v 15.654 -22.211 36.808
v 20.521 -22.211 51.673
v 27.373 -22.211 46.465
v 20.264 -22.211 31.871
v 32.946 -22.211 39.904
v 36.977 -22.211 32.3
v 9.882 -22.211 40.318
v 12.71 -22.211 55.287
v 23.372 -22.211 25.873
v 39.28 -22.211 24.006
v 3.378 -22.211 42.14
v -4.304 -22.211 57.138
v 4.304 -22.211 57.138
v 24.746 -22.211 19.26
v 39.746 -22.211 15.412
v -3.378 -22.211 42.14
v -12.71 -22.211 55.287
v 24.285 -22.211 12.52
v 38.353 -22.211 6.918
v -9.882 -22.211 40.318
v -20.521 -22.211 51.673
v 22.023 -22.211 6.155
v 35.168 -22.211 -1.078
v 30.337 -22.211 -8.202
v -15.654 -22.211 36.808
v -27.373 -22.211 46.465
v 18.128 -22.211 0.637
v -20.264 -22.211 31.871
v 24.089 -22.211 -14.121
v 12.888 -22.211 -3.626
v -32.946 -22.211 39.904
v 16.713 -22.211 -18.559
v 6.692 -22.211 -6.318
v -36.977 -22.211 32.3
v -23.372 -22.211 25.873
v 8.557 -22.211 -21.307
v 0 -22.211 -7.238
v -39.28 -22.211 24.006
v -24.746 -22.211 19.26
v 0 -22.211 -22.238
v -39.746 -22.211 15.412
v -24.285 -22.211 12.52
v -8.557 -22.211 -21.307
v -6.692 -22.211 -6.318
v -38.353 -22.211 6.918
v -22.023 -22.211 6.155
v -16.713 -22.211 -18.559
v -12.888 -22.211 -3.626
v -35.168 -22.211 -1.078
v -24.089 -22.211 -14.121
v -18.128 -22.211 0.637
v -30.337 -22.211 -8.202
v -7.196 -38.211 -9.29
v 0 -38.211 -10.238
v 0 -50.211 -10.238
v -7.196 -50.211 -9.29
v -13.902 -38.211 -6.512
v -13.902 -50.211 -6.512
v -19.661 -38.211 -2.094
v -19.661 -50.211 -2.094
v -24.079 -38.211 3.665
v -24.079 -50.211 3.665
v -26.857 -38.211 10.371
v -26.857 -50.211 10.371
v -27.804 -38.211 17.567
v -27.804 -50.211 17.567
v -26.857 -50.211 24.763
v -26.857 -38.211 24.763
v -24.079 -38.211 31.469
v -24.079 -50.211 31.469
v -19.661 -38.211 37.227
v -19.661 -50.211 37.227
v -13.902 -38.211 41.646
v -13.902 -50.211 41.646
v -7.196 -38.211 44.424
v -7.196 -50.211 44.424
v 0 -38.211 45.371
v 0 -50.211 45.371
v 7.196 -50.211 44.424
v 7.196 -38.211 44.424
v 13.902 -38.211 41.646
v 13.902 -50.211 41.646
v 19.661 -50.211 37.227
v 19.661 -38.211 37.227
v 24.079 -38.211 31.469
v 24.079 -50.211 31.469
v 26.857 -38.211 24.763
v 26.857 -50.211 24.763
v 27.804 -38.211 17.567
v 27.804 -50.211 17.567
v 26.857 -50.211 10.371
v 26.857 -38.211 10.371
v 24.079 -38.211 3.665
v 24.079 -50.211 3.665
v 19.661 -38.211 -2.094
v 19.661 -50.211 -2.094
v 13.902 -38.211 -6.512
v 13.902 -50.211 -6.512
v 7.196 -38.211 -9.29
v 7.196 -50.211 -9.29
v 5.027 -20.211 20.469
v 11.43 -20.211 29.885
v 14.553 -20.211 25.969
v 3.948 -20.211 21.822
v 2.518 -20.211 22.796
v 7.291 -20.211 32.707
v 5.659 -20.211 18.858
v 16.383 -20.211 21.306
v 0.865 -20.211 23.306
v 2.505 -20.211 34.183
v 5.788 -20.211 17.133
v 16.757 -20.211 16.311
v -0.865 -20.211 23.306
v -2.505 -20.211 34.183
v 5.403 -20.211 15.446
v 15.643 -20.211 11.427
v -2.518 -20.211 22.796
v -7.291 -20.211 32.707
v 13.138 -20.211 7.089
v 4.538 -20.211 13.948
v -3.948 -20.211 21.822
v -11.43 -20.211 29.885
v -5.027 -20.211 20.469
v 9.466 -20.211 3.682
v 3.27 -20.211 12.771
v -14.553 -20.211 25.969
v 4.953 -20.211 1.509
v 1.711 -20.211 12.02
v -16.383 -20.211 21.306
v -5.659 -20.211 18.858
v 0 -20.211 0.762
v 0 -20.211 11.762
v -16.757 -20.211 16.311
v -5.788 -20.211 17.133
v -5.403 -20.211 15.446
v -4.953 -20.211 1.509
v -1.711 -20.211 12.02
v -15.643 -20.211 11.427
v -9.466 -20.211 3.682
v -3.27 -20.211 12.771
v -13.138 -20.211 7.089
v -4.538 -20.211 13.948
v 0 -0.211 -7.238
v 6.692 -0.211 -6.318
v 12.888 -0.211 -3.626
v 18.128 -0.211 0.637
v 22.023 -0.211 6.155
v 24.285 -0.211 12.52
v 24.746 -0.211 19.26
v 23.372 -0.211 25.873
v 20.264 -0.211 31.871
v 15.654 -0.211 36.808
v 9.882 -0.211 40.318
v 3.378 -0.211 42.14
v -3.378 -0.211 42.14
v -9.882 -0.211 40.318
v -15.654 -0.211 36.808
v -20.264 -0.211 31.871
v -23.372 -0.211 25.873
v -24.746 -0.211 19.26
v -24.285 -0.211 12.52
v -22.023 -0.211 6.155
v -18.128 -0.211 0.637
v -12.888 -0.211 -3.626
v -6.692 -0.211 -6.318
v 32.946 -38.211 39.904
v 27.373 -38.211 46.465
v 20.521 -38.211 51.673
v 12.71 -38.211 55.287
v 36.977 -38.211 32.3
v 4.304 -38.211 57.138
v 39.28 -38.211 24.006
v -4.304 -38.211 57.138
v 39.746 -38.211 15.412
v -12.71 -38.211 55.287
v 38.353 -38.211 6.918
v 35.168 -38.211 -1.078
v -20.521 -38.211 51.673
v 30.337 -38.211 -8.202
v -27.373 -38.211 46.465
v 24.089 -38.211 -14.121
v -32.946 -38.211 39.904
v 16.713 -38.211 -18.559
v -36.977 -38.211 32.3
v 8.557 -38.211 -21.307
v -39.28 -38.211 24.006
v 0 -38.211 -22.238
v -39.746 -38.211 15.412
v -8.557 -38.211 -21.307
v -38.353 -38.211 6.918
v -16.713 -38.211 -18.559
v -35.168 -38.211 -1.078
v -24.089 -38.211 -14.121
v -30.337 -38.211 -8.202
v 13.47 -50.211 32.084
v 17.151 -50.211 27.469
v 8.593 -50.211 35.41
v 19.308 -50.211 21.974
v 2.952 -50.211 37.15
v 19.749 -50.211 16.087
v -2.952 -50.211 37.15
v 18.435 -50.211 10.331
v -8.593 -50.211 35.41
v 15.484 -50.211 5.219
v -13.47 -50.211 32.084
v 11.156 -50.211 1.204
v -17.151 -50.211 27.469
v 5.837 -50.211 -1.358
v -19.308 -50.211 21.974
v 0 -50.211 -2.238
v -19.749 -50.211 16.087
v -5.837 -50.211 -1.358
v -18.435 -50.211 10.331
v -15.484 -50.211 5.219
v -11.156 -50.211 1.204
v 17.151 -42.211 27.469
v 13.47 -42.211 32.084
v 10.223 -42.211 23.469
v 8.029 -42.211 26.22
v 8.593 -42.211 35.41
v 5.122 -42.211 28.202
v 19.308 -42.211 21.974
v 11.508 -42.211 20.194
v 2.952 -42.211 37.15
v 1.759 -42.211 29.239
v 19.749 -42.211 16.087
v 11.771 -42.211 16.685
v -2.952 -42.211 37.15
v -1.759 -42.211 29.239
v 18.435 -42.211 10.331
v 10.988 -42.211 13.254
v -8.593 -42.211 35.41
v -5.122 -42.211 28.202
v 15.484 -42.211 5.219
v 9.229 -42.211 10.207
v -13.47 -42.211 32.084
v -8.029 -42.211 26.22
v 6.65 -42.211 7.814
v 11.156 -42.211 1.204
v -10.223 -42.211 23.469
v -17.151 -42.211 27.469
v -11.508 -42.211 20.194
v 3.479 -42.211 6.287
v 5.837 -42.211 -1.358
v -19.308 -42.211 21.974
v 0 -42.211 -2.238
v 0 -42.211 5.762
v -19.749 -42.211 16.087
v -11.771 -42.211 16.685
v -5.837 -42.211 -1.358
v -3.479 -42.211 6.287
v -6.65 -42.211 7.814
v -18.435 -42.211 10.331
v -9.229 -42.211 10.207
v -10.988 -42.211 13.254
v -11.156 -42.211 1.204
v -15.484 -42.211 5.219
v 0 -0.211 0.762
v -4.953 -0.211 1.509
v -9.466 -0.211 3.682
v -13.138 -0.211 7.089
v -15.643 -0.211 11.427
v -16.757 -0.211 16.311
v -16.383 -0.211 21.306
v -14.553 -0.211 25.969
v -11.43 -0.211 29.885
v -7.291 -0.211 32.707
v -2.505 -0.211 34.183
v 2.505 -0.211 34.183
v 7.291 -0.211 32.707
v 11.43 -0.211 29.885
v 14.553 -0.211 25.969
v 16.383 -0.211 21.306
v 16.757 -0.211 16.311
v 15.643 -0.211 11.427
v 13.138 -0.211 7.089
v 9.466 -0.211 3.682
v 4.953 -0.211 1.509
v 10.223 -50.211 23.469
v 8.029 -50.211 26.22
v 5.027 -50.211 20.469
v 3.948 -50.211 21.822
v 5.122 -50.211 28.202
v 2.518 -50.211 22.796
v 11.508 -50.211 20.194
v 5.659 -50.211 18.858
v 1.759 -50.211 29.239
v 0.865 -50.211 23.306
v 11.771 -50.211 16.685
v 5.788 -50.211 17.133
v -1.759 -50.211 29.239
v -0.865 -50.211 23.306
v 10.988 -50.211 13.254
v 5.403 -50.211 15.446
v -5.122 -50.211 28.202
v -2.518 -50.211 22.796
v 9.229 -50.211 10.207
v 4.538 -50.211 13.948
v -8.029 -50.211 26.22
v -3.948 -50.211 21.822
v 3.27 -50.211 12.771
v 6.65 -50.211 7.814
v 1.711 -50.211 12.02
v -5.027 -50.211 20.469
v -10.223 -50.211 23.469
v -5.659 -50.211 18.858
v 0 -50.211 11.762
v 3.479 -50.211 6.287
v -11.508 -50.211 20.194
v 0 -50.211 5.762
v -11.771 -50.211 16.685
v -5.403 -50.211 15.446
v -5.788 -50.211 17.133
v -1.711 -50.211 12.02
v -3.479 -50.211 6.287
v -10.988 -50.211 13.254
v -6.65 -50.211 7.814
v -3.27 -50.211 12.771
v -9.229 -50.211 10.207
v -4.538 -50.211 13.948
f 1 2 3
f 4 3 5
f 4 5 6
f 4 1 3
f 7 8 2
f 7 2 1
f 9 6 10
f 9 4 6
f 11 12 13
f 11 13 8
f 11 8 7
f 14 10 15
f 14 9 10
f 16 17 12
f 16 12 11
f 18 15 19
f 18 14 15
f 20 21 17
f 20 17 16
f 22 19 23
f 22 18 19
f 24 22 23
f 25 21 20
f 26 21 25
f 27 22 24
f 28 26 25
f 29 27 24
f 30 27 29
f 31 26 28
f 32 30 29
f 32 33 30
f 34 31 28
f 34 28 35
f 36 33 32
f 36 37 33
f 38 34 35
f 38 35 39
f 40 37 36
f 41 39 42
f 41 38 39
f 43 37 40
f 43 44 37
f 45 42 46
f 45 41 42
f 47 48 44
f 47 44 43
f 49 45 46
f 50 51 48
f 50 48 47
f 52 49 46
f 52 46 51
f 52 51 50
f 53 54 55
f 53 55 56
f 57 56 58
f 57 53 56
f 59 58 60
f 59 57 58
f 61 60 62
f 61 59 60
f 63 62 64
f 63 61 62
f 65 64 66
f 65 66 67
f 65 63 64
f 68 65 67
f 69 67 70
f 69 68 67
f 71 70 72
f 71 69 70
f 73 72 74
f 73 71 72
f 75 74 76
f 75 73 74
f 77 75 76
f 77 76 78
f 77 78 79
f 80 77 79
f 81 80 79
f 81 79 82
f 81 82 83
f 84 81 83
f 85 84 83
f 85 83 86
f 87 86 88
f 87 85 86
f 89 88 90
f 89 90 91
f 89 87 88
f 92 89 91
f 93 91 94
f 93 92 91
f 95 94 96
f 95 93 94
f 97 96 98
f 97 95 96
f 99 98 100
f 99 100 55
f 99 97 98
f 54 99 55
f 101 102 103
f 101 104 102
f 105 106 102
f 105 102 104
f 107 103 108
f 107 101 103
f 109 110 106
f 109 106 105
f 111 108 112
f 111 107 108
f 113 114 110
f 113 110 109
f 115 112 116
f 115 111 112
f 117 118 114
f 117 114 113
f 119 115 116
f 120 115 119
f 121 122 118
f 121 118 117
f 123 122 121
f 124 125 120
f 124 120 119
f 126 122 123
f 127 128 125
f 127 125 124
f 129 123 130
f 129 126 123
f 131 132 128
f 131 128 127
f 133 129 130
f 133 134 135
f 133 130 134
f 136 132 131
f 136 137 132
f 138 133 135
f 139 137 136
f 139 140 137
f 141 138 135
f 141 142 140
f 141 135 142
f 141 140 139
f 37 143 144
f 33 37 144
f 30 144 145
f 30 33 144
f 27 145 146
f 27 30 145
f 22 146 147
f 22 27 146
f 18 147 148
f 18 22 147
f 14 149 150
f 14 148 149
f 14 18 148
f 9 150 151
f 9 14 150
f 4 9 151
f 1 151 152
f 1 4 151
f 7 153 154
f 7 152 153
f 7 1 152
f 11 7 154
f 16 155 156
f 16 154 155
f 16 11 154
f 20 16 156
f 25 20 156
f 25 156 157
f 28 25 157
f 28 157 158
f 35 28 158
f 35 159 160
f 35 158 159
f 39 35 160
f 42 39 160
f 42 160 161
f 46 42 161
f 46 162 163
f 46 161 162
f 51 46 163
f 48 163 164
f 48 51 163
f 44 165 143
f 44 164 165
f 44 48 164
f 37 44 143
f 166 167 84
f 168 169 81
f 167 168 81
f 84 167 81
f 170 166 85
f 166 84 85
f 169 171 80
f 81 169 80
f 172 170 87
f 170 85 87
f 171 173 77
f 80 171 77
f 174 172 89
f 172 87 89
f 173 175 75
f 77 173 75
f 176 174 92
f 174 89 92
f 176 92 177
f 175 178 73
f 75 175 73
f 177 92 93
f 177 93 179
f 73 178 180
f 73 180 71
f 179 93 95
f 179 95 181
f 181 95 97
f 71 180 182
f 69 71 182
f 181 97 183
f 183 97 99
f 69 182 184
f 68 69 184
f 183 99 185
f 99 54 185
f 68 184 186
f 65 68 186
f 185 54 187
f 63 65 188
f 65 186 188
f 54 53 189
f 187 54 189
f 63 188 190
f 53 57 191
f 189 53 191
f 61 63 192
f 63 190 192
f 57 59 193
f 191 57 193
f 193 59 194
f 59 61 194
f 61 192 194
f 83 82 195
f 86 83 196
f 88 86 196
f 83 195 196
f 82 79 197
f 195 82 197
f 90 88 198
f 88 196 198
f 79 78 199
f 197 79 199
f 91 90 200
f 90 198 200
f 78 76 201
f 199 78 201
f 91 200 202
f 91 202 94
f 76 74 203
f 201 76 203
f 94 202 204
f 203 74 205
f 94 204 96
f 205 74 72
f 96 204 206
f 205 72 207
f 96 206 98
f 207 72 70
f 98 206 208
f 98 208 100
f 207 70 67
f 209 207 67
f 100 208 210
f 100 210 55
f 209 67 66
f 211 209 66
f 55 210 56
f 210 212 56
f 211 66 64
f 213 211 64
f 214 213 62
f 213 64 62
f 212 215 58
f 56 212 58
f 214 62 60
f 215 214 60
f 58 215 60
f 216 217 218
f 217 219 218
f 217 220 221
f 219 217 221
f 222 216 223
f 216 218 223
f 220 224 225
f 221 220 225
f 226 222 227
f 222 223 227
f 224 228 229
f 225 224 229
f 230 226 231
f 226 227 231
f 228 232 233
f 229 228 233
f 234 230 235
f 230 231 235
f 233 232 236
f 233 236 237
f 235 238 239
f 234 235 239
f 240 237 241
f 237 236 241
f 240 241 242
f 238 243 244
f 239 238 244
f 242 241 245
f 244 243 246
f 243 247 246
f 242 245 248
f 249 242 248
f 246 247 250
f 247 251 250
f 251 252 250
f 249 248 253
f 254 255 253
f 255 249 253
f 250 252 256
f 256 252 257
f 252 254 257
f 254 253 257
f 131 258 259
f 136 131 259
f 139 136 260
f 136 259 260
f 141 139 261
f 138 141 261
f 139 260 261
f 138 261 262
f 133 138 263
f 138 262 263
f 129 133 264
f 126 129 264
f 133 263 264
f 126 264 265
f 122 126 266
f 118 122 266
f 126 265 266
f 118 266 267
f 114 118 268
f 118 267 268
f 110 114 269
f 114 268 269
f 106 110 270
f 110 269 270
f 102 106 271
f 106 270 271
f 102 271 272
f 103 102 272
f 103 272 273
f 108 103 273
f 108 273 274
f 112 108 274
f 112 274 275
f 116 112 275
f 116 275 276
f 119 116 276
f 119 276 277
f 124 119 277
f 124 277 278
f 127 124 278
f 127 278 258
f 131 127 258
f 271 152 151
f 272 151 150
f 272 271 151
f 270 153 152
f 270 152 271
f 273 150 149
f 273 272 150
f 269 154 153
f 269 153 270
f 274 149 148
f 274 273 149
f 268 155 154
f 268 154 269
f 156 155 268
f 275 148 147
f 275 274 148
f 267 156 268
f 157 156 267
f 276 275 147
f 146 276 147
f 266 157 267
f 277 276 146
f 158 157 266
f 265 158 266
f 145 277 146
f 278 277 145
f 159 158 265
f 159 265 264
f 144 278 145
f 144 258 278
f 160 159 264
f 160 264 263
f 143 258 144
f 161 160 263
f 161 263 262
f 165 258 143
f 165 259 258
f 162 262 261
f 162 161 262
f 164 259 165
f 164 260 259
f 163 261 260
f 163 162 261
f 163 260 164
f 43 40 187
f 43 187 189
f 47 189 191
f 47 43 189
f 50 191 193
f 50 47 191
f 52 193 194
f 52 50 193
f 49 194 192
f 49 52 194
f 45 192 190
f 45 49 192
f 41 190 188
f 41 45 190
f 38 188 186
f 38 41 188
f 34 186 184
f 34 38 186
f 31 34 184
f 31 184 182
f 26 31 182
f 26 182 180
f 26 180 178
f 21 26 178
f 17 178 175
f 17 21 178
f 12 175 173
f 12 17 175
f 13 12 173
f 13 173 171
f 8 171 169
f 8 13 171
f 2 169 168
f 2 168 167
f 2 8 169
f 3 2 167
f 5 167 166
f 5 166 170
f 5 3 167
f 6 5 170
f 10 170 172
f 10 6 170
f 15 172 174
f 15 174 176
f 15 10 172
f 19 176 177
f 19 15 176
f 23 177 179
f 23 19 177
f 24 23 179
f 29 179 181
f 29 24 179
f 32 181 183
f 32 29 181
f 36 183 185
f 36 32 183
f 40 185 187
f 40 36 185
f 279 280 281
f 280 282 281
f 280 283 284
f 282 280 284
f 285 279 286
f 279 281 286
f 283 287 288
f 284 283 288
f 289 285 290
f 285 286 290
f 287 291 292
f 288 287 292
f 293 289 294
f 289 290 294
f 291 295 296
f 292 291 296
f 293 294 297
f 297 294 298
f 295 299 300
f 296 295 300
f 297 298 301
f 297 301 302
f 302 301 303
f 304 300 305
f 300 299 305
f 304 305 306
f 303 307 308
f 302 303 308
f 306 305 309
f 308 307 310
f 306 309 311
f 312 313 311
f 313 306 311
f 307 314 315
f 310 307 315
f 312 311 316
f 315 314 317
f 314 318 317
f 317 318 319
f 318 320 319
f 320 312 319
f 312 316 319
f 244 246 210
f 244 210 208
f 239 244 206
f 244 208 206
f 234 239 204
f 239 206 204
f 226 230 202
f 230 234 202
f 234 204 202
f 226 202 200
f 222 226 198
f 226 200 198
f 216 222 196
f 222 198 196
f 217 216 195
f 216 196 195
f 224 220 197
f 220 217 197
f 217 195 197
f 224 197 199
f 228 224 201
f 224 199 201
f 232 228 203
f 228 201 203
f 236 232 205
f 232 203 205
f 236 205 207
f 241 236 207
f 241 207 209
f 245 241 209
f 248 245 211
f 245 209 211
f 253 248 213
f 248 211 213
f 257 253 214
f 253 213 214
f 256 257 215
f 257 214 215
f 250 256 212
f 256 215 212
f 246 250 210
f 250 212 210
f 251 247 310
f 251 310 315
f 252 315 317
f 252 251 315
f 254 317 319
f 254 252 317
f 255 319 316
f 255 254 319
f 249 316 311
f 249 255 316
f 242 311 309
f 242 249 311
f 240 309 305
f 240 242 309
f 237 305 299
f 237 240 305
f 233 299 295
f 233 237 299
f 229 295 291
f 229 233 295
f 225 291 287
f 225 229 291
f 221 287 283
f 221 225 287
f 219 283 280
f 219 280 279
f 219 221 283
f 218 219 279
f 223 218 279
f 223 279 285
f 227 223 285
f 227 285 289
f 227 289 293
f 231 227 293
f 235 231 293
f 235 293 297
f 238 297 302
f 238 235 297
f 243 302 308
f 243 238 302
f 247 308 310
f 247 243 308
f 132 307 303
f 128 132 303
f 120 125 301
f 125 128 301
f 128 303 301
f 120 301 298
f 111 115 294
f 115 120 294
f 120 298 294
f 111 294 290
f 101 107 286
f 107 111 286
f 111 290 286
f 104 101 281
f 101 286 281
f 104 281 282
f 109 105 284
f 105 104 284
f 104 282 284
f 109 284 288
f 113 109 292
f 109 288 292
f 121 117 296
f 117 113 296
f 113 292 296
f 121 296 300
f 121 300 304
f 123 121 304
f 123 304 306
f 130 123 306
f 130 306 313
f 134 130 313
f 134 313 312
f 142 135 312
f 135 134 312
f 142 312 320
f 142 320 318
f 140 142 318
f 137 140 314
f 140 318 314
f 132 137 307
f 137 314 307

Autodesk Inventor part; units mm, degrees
ref_plane "YZ Plane" through (0, 0, 0) normal (1, 0, 0) x (0, 1, 0)
ref_plane "XZ Plane" through (0, 0, 0) normal (0, 1, 0) x (-1, 0, 0)
ref_plane "XY Plane" through (0, 0, 0) normal (0, 0, 1) x (1, 0, 0)
sketch "Эскиз1" plane through (0, 0, 0) normal (1, 0, 0) x (0, 1, 0)
  line L0 (-20.211, 11.7625) -> (-20.211, 0.7625)
  line L1 (-20.211, 0.7625) -> (-0.211, 0.7625)
  line L2 (-0.211, 0.7625) -> (-0.211, -7.2375)
  line L3 (-0.211, -7.2375) -> (-22.211, -7.2375)
  line L4 (-22.211, -7.2375) -> (-22.211, -22.2375)
  line L5 (-20.211, 11.7625) -> (-50.211, 11.7625)
  line L6 (-50.211, 11.7625) -> (-50.211, 5.7625)
  line L7 (-50.211, 5.7625) -> (-42.211, 5.7625)
  line L8 (-42.211, 5.7625) -> (-42.211, -2.2375)
  line L9 (-42.211, -2.2375) -> (-50.211, -2.2375)
  line L10 (-50.211, -2.2375) -> (-50.211, -10.2375)
  line L11 (-50.211, -10.2375) -> (-38.211, -10.2375)
  line L12 (-38.211, -10.2375) -> (-38.211, -22.2375)
  line L13 (-38.211, -22.2375) -> (-22.211, -22.2375)
  point P0 (0, 0)
  dimension "d0" = 15
  dimension "d1" = 22
  dimension "d2" = 20
  dimension "d3" = 11
  dimension "d4" = 12
  dimension "d5" = 12
  dimension "d6" = 8
  dimension "d7" = 6
  dimension "d8" = 50
  dimension "d9" = 50
  dimension "d10" = 34
  dimension "d11" = 8
sketch "Эскиз2" plane through (0, 0, 0) normal (1, 0, 0) x (0, 1, 0)
  line L0 (-49.3354, 11.5668) -> (-49.3354, 17.5668)
  line L1 (-49.3354, 17.5668) -> (-14.2528, 17.5668)
  point P0 (0, 0)
  dimension "d12" = 6
revolve "Вращение1" add sketch "Эскиз1" angle 360 about axis through (0, -49.3354, 17.5668) along (0, 1, 0)
properties part number "Задание номер 3"
